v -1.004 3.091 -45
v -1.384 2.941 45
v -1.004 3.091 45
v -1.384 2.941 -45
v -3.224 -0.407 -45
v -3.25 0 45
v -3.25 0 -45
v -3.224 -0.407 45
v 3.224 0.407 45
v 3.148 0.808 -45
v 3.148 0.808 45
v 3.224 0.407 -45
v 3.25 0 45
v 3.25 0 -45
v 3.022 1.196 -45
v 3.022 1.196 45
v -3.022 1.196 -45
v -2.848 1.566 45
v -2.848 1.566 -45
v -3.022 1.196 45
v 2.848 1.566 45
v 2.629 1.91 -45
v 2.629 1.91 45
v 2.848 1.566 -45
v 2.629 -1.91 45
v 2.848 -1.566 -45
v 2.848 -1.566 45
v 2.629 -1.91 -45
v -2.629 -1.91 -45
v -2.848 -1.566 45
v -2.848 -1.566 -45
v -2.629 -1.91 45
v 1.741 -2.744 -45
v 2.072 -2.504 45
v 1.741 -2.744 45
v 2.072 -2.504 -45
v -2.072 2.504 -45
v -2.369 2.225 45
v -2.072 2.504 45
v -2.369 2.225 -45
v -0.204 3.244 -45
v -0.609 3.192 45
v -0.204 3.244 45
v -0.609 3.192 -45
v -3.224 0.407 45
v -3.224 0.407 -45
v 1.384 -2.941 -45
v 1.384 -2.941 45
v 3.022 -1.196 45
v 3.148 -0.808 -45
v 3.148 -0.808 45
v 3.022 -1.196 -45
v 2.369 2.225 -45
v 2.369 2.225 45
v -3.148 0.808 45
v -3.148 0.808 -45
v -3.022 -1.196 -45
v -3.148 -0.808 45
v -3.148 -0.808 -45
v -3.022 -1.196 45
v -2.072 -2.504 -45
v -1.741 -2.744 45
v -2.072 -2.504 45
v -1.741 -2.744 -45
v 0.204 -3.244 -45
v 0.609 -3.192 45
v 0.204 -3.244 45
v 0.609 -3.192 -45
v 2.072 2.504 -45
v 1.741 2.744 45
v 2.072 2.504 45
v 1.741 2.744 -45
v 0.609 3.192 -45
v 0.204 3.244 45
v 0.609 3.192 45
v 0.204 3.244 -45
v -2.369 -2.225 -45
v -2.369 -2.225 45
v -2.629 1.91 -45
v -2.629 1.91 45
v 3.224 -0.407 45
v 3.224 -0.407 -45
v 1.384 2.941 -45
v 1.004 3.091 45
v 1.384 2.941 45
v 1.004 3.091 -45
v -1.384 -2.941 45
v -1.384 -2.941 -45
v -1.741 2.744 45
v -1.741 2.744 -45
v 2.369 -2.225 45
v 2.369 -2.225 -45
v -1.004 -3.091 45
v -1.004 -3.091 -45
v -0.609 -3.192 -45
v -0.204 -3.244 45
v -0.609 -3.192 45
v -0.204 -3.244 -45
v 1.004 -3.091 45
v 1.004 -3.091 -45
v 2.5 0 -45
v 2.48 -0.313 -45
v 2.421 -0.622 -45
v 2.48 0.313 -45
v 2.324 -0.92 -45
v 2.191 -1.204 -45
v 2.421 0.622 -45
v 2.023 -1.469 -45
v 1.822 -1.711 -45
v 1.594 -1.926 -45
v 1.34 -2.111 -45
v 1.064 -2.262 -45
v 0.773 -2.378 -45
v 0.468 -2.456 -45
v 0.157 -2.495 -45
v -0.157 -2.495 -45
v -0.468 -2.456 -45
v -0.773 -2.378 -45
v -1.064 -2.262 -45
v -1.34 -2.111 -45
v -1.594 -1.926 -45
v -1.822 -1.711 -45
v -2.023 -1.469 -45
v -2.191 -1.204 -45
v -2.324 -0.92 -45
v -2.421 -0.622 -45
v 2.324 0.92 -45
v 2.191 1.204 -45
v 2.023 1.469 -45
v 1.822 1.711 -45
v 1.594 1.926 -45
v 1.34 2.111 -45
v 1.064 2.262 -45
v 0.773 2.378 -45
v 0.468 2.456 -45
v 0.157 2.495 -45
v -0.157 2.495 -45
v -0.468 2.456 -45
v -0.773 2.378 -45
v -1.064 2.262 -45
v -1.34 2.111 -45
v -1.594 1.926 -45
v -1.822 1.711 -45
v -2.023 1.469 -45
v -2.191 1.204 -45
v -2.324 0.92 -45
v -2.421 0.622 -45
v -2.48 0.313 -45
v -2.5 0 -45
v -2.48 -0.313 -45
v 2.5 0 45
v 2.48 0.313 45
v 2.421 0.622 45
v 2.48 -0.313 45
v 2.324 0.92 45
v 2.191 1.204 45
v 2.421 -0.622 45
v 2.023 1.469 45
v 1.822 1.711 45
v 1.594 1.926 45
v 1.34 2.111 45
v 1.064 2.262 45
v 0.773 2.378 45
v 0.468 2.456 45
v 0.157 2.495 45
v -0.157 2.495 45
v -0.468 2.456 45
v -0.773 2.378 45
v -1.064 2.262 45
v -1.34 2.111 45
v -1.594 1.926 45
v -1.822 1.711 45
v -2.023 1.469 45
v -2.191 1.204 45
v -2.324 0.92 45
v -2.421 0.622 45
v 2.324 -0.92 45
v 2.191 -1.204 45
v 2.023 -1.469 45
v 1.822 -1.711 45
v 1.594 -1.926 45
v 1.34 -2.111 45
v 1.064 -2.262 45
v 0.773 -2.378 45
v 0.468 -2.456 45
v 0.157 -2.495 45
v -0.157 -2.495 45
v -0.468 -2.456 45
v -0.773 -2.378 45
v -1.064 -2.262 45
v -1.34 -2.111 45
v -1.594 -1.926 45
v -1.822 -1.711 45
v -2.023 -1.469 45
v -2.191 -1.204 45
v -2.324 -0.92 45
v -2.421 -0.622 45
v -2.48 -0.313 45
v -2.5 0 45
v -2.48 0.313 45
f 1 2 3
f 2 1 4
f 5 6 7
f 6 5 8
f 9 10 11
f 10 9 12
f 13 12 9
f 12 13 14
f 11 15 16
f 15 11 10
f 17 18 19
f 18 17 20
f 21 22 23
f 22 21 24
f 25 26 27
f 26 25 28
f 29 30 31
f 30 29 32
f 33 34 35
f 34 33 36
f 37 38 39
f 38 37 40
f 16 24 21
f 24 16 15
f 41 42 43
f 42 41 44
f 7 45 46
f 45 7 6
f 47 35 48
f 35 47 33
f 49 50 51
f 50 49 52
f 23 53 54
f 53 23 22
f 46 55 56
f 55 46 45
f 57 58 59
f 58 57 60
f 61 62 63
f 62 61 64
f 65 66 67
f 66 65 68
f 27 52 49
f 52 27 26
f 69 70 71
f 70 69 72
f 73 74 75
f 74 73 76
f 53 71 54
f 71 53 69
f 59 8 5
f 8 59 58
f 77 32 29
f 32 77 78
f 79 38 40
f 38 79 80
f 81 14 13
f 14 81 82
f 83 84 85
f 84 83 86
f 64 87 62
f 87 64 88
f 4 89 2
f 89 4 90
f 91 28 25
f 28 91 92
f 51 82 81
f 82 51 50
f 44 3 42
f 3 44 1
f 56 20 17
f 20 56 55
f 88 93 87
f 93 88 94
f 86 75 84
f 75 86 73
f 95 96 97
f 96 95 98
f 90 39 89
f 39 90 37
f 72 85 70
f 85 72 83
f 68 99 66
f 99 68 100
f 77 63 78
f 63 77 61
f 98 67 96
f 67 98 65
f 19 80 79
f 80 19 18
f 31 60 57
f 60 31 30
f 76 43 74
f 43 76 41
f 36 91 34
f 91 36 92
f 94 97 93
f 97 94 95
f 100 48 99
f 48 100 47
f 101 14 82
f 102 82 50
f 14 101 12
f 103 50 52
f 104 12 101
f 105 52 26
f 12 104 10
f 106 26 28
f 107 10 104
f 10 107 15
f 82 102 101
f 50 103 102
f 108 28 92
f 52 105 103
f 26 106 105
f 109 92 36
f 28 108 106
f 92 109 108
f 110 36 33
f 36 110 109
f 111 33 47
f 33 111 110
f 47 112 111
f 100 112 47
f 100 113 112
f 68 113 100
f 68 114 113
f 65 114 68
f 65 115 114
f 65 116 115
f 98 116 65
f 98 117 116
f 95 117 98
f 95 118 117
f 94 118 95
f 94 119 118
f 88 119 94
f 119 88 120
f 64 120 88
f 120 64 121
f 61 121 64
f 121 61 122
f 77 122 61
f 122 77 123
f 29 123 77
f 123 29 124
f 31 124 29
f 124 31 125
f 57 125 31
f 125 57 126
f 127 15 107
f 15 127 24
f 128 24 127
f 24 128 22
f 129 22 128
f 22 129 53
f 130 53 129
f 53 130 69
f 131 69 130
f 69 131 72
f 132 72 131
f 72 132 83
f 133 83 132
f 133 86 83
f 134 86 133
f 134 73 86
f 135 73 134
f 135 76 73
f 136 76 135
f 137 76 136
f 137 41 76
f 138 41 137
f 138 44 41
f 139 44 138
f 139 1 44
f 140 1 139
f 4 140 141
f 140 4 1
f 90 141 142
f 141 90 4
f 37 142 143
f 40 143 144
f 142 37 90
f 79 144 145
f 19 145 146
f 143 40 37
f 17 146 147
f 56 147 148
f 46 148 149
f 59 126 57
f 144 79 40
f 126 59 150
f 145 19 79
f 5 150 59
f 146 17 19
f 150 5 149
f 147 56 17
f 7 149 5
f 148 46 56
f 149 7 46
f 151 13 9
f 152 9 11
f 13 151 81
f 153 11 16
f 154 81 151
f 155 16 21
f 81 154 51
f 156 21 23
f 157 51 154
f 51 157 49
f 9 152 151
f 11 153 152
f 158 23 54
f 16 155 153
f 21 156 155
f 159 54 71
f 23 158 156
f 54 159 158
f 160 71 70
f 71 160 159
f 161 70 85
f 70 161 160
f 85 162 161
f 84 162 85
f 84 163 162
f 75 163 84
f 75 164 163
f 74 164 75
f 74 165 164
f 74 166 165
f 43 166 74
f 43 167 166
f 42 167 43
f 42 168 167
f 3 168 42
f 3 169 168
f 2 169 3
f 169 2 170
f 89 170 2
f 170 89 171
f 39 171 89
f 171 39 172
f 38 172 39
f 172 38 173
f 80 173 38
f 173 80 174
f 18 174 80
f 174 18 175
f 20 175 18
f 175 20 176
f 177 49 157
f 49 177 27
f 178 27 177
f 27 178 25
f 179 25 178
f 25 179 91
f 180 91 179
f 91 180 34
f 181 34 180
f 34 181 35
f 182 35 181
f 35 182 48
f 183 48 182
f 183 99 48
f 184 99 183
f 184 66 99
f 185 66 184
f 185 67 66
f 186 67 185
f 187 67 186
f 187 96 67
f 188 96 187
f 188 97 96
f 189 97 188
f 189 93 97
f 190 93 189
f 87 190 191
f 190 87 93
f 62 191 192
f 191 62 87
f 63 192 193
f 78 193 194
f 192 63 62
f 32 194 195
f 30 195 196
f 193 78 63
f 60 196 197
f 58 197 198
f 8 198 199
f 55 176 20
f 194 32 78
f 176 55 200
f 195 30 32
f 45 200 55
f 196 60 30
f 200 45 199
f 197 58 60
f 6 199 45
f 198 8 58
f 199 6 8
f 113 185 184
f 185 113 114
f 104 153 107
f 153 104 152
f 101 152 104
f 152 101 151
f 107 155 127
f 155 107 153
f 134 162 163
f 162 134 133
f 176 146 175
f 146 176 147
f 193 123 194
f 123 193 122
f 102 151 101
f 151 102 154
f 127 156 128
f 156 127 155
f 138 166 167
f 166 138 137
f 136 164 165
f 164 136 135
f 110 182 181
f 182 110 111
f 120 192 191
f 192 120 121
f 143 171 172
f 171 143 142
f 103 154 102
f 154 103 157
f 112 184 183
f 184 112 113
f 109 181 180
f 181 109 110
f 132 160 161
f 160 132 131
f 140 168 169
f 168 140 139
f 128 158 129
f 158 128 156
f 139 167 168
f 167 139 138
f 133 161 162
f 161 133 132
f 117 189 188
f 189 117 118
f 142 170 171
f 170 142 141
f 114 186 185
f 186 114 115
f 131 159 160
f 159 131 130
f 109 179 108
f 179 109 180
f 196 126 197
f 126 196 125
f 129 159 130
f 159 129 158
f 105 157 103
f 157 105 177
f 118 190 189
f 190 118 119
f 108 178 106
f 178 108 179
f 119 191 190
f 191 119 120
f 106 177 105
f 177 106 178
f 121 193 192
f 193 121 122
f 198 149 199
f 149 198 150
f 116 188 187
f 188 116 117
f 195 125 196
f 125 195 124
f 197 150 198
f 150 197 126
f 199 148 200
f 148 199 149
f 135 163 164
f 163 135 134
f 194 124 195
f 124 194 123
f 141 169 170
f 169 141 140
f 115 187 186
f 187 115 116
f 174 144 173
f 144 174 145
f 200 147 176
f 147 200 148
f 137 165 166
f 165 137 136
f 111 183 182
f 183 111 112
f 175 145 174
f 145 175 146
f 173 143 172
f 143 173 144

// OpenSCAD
$fn = 50;


difference() {
	union() {
		translate(v = [0, 0, -45.0000000000]) {
			cylinder(h = 90, r = 3.2500000000);
		}
	}
	union() {
		translate(v = [0, 0, -100.0000000000]) {
			cylinder(h = 200, r = 2.5000000000);
		}
	}
}
